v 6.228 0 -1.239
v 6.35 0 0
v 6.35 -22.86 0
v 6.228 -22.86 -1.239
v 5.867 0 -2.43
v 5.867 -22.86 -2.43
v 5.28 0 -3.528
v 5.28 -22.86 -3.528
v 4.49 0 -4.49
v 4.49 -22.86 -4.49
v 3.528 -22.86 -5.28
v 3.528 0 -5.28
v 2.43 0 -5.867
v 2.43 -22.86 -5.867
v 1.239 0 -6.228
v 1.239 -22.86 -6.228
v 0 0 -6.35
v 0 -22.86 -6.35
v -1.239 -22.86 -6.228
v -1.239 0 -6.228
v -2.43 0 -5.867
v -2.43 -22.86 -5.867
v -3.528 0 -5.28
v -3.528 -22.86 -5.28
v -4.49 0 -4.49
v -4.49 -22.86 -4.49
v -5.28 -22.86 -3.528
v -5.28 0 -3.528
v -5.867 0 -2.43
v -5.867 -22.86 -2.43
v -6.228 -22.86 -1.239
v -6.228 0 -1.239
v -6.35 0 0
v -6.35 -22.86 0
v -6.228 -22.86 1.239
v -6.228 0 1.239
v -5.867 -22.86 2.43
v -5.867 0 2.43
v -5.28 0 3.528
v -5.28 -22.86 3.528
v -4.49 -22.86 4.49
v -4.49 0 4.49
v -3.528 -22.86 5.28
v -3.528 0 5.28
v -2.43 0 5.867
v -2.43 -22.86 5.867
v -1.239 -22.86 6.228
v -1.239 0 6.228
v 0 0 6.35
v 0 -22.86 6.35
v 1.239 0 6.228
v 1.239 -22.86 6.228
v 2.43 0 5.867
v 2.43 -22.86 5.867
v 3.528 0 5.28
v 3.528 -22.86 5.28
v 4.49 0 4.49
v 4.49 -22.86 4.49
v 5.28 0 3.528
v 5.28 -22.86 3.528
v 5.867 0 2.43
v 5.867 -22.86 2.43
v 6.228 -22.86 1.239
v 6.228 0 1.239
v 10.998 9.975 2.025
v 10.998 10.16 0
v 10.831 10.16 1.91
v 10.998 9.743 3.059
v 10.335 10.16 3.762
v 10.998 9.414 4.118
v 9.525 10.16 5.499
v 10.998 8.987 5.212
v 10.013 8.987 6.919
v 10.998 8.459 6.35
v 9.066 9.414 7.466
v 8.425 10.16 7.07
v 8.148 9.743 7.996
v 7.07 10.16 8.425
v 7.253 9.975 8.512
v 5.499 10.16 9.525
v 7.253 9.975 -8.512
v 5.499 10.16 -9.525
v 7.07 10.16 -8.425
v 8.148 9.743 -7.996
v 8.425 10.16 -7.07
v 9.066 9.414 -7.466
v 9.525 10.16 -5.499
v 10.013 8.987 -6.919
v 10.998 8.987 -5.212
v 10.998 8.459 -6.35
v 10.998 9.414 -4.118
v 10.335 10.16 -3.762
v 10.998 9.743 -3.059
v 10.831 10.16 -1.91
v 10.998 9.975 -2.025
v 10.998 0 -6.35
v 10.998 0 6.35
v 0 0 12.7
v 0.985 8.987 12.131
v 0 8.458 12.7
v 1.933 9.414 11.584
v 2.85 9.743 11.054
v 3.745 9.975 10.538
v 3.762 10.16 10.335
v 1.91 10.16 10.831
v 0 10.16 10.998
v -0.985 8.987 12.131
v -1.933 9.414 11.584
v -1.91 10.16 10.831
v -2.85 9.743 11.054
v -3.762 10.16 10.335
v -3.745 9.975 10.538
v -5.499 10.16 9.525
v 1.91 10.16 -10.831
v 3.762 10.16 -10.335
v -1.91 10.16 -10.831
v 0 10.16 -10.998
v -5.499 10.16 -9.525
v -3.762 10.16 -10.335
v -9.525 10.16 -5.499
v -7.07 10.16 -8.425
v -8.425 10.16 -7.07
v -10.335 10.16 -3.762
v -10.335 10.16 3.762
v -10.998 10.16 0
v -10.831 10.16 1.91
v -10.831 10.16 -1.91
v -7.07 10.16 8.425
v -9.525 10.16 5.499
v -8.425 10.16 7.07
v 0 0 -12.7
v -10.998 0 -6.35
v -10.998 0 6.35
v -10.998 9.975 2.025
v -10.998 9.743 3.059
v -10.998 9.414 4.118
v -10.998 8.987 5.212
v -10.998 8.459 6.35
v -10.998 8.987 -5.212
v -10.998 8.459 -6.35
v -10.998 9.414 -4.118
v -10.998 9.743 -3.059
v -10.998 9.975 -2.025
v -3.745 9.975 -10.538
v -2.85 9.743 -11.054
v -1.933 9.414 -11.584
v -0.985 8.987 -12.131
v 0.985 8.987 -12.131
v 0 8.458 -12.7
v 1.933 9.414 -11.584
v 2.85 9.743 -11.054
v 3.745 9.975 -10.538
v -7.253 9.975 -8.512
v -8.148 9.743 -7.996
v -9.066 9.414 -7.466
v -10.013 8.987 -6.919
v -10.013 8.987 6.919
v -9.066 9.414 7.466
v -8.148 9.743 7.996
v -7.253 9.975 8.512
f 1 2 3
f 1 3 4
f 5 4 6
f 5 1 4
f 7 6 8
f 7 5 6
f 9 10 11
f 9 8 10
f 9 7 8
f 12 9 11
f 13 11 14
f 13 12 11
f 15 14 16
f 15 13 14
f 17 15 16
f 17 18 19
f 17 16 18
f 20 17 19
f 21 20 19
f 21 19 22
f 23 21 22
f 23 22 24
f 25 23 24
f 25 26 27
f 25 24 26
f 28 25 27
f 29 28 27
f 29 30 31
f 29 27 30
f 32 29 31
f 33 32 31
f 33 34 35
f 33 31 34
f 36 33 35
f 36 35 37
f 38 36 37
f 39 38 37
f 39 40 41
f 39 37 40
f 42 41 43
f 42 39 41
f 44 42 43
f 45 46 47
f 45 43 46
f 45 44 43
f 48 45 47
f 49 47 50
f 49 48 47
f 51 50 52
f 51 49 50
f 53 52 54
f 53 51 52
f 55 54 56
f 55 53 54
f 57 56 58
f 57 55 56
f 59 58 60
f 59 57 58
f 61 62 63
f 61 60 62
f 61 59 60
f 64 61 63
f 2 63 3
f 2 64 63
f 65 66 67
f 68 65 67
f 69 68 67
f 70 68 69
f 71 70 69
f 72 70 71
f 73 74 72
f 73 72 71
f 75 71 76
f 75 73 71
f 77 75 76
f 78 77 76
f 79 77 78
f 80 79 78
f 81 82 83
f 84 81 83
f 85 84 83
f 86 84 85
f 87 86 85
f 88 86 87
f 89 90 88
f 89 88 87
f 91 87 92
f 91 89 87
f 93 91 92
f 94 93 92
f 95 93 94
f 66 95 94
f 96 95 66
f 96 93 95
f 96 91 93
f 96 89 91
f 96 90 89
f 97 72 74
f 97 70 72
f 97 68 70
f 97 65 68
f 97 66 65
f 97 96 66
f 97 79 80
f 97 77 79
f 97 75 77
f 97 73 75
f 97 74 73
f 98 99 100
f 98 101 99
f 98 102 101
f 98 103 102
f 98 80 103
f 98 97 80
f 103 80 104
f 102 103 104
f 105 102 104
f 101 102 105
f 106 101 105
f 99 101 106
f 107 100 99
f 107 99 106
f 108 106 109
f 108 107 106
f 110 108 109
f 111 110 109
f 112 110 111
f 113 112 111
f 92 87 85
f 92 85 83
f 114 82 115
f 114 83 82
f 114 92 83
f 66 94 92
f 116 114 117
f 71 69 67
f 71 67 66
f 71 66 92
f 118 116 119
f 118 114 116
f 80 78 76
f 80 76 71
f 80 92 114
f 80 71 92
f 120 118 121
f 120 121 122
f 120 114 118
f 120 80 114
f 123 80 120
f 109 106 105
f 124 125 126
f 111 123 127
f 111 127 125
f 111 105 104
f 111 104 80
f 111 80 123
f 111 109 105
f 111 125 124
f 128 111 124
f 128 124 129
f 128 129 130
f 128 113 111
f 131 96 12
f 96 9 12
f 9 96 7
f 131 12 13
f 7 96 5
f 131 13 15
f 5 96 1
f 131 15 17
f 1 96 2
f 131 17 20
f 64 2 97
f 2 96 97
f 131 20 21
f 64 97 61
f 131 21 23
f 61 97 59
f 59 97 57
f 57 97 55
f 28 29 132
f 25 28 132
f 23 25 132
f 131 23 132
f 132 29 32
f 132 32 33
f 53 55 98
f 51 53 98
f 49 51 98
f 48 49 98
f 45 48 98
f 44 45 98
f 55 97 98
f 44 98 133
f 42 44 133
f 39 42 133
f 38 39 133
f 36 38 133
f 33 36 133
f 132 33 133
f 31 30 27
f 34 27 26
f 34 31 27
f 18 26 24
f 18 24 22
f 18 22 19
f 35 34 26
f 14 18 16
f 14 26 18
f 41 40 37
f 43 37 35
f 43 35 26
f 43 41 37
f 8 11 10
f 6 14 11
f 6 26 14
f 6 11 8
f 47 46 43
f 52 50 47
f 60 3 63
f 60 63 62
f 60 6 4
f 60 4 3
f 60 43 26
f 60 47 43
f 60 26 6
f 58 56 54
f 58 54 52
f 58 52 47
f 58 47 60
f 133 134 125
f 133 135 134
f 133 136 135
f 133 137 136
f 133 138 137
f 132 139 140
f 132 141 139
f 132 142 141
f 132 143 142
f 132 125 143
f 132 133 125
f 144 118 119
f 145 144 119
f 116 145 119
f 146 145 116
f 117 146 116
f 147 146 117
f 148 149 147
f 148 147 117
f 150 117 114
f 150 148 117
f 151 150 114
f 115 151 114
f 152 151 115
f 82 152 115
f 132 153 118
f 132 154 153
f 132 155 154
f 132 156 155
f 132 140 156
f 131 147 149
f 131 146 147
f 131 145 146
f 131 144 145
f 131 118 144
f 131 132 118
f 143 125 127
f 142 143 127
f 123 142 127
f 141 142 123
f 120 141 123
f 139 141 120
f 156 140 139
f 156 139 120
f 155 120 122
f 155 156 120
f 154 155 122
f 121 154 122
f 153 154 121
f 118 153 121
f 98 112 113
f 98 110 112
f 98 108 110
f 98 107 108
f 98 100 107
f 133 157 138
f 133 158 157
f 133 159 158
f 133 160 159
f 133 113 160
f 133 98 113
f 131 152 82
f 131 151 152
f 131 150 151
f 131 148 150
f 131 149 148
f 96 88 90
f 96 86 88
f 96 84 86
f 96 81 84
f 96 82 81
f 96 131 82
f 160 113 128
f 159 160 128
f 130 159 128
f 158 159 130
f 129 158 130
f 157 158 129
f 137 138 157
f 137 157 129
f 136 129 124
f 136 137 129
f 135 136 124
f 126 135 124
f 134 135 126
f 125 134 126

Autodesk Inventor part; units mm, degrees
ref_plane "YZ Plane" through (0, 0, 0) normal (1, 0, 0) x (0, 1, 0)
ref_plane "XZ Plane" through (0, 0, 0) normal (0, 1, 0) x (-1, 0, 0)
ref_plane "XY Plane" through (0, 0, 0) normal (0, 0, 1) x (1, 0, 0)
sketch "Sketch1" plane through (0, 0, 0) normal (0, 1, 0) x (-1, 0, 0)
  line L0 (10.9985, -6.35) -> (0, -12.7)
  line L1 (0, -12.7) -> (-10.9985, -6.35)
  line L2 (-10.9985, -6.35) -> (-10.9985, 6.35)
  line L3 (-10.9985, 6.35) -> (0, 12.7)
  line L4 (0, 12.7) -> (10.9985, 6.35)
  line L5 (10.9985, 6.35) -> (10.9985, -6.35)
  point P0 (0, 0)
  point P1 (0, 0)
  dimension "d0" = 25.4
extrude "Extrusion1" add sketch "Sketch1" along normal blind 10.16
sketch "Sketch2" plane through (0, 10.16, 0) normal (0, 1, 0) x (1, 0, 0)
  circle A0 centre (0, 0) radius 10.9985
extrude "Extrusion2" cut sketch "Sketch2" against normal through all draft 45 keep common part
sketch "Sketch3" plane through (0, 0, 0) normal (0, -1, 0) x (1, 0, 0)
  circle A0 centre (0, 0) radius 6.35
  dimension "d5" = 12.7
extrude "Extrusion3" add sketch "Sketch3" along normal blind 22.86
thread "Thread1" size "1/2-13 UNC" class "1A" standard "ANSI Unified Screw Threads" full length
properties part number "Bolt"
